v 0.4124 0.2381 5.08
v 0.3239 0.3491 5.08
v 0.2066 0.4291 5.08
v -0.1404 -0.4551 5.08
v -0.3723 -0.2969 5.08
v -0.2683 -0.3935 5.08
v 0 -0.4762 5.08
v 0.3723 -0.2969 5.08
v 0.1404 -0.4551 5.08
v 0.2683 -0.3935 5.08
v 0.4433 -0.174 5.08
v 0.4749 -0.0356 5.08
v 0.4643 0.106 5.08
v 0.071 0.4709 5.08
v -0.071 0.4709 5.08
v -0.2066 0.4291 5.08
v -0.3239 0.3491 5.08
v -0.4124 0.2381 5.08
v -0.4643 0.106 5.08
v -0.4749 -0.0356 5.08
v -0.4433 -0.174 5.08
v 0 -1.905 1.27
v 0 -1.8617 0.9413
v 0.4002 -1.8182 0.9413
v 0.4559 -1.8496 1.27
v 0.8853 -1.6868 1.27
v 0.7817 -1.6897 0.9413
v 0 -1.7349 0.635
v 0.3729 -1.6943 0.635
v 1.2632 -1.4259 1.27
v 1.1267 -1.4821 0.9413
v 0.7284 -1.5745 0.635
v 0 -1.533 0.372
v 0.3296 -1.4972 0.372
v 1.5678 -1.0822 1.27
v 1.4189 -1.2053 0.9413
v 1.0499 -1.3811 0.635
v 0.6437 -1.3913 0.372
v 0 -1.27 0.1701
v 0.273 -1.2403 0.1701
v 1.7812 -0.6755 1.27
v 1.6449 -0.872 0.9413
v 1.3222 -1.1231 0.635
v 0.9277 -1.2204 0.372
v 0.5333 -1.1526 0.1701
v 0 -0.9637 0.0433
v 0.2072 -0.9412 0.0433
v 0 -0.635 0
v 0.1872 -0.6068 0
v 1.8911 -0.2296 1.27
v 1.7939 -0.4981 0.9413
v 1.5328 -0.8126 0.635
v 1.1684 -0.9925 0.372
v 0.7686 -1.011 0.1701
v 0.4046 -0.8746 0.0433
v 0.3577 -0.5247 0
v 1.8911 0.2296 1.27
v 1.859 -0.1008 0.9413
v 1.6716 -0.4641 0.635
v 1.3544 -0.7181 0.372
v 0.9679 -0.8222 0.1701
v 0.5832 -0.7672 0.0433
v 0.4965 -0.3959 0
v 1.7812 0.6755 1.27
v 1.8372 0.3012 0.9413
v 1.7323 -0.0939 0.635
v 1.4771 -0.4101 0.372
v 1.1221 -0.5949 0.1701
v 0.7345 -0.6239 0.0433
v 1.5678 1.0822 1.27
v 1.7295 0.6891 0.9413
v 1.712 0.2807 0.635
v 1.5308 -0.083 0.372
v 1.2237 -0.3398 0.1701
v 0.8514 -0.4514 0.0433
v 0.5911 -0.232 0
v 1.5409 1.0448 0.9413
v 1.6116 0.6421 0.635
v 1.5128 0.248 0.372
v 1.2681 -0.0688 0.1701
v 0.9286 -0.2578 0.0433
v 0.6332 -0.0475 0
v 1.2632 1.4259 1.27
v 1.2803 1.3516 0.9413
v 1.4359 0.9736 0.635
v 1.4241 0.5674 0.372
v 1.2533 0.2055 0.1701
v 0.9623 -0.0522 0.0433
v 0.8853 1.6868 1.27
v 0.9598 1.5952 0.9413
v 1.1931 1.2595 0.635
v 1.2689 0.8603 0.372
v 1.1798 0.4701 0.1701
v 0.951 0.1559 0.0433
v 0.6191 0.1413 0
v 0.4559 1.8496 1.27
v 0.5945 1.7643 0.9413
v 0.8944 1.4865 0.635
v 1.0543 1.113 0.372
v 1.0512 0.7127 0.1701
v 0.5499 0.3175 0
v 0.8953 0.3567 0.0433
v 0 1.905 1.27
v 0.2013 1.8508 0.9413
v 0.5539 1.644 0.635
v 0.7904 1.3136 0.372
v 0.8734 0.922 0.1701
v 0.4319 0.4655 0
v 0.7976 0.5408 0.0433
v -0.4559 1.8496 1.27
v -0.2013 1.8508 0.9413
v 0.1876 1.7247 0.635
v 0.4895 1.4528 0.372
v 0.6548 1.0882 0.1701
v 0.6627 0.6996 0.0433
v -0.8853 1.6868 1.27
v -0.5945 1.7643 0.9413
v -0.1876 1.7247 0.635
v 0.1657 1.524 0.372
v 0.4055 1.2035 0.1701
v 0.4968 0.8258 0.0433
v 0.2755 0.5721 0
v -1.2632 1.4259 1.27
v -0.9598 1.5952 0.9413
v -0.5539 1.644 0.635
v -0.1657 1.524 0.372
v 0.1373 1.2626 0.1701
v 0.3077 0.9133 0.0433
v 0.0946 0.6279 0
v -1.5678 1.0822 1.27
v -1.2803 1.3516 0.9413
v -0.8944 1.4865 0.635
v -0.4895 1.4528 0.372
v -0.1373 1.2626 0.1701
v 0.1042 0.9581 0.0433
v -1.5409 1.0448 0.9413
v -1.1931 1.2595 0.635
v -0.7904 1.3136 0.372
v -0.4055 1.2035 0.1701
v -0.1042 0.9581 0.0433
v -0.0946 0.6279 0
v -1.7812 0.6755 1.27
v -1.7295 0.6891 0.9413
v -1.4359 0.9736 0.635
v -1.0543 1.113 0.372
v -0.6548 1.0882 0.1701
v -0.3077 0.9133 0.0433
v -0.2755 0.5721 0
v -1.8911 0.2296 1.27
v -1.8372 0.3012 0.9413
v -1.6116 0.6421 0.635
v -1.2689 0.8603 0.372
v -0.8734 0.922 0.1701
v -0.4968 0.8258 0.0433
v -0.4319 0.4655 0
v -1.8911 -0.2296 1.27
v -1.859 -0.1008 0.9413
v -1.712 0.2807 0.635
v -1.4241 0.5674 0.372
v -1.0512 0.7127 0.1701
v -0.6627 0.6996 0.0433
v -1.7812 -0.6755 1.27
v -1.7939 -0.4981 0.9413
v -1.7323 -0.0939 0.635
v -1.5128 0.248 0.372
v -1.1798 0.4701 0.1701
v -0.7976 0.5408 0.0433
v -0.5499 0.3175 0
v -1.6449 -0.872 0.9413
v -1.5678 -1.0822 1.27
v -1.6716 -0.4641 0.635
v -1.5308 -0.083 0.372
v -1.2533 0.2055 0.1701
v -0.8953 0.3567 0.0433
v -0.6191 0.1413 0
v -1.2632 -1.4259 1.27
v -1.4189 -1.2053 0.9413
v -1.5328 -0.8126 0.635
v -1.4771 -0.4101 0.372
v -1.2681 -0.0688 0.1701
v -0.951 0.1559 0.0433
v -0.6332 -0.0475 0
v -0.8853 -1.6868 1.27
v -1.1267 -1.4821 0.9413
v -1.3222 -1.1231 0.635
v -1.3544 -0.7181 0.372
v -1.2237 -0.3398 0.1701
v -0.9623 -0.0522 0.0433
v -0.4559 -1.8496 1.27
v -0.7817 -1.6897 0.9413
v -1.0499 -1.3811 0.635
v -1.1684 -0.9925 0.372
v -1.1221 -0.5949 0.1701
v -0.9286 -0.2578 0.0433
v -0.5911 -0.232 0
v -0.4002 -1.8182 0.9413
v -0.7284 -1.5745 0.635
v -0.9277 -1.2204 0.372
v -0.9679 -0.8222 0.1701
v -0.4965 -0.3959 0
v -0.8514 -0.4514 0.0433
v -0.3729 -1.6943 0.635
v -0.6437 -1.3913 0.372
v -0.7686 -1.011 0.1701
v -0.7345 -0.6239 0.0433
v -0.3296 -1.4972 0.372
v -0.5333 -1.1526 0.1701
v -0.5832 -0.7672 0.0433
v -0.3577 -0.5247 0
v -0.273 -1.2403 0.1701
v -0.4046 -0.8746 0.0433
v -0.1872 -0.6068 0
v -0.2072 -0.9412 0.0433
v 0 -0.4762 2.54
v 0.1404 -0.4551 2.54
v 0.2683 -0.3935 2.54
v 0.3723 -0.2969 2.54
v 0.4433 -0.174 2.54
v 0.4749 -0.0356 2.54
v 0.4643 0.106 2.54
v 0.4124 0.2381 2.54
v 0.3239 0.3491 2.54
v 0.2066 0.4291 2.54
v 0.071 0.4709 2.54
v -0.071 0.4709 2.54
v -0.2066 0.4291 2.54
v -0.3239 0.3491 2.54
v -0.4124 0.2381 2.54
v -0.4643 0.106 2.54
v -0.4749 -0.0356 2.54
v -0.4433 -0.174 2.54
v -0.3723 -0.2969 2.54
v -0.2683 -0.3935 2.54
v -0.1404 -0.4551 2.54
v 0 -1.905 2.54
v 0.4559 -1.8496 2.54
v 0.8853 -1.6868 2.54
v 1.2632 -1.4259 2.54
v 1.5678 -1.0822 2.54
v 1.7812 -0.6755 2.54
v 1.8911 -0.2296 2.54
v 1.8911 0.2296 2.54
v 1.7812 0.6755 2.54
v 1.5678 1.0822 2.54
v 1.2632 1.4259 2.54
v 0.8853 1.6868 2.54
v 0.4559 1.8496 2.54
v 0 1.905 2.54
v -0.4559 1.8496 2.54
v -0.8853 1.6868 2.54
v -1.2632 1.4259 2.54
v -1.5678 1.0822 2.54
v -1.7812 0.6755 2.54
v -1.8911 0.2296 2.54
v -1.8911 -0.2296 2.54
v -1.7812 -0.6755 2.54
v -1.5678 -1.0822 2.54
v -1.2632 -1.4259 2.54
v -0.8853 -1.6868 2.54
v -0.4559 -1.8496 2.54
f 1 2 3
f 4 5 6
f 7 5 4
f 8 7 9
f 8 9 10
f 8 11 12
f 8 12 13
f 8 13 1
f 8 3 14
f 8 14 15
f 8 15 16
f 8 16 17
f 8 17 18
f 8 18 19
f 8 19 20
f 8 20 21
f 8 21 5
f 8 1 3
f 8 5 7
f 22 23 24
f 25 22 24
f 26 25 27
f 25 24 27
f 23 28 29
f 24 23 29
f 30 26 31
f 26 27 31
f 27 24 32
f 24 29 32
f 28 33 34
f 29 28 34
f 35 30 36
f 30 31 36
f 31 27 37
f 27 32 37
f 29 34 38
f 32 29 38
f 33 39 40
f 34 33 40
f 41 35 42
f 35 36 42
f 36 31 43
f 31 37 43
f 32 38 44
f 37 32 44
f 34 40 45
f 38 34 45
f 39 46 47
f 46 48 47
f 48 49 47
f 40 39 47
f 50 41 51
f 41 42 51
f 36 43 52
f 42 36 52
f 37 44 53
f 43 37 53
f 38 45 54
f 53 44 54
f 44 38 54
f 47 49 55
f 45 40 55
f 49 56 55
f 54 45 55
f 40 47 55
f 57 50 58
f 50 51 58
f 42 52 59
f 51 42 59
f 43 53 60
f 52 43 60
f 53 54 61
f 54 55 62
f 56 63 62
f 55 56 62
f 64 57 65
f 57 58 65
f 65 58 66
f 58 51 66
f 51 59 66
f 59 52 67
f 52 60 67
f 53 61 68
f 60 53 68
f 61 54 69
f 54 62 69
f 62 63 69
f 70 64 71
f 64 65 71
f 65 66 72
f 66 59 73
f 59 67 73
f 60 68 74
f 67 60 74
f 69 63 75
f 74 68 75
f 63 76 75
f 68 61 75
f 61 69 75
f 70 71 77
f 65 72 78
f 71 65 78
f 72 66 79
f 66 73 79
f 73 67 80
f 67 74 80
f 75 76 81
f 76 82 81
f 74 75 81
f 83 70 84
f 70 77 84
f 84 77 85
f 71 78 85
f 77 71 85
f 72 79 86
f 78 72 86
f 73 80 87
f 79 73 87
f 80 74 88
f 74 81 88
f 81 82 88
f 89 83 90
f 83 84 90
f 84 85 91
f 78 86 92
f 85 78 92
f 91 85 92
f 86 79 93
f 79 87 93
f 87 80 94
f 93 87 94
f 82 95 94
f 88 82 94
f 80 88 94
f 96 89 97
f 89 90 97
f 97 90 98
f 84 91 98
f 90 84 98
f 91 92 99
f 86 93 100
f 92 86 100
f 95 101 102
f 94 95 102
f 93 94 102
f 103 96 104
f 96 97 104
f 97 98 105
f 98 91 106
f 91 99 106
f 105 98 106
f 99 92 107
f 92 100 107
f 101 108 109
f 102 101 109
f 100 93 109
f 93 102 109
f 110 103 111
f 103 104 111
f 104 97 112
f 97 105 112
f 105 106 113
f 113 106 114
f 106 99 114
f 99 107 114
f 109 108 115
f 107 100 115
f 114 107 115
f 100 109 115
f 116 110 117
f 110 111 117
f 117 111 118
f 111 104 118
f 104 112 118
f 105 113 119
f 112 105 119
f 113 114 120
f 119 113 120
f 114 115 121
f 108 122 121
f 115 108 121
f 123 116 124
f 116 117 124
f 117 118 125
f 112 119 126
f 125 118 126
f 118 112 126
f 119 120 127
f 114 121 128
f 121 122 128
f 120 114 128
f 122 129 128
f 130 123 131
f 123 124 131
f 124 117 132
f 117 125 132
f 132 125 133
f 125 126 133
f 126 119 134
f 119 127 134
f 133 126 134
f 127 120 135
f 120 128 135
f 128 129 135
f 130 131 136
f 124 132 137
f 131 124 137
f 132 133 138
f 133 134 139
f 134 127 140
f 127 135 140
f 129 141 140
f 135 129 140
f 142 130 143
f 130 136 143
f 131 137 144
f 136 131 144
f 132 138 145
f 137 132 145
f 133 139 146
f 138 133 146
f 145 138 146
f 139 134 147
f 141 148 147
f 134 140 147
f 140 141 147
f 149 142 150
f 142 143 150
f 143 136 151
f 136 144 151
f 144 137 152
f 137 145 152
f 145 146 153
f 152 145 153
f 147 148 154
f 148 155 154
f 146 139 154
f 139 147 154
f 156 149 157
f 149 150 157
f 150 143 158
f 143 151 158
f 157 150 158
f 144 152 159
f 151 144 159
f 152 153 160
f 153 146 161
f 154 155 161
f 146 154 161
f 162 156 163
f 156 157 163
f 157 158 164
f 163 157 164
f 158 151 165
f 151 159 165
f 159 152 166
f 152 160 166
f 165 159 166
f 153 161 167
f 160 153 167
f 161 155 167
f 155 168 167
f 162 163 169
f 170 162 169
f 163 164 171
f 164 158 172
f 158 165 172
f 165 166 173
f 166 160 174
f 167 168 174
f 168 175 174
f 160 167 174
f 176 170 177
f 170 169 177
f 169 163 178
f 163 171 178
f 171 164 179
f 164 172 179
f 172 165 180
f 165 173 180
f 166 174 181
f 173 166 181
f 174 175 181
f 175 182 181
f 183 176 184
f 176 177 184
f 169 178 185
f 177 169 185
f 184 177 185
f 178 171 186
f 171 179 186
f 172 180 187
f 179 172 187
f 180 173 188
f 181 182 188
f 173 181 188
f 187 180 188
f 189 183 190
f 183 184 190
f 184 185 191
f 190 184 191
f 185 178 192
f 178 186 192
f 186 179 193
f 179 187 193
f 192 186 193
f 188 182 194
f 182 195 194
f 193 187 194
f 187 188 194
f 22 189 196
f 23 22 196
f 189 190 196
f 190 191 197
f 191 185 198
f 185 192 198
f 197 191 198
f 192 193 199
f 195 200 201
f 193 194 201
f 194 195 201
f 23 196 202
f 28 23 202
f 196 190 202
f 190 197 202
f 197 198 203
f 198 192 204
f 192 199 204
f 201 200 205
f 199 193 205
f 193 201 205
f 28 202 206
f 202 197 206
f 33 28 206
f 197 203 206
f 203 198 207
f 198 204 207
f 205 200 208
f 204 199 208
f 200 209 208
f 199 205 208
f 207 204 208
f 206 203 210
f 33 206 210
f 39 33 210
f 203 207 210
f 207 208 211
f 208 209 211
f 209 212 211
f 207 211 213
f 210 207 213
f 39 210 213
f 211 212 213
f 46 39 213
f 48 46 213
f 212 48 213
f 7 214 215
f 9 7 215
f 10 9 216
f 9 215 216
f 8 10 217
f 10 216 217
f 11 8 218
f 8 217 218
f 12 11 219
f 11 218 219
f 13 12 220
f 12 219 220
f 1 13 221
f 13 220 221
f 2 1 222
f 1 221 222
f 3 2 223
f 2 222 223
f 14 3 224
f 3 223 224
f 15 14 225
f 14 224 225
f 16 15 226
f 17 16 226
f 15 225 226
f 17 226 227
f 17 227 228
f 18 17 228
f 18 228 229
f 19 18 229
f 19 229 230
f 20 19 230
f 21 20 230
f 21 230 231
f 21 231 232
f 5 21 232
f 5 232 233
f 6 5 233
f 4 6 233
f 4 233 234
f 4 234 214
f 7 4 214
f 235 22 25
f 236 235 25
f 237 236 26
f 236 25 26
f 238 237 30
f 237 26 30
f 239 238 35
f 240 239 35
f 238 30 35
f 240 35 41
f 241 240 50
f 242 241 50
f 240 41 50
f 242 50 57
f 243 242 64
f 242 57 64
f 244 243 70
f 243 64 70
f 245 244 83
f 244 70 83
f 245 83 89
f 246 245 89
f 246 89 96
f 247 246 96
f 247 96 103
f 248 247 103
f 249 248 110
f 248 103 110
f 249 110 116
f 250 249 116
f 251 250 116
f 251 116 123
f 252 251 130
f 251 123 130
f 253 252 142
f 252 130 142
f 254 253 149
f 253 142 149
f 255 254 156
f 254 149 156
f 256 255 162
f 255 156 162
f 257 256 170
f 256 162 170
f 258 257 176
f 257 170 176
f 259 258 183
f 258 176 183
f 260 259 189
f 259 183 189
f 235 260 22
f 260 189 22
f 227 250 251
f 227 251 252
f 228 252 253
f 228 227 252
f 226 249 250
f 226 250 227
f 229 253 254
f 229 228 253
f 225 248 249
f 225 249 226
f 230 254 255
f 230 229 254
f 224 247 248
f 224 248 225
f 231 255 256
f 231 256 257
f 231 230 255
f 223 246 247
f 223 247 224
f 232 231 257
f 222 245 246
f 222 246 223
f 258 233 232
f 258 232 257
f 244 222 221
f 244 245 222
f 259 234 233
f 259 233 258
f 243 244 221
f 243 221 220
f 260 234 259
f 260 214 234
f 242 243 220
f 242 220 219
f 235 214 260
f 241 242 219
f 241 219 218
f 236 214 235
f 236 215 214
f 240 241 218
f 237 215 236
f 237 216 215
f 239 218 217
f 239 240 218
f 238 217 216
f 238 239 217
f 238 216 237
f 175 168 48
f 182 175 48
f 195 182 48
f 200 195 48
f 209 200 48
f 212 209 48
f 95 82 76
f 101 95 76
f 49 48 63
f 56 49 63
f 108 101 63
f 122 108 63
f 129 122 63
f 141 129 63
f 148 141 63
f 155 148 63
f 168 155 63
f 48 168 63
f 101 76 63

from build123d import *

# Parameters (mm, degrees)
F0_R     = 1.905
F0_R_2   = 0.47625
F1_DEPTH = 2.54
F2_DEPTH = 5.08
F4_R     = 1.27
F3_R     = 2.58953
F5_DEPTH = 1.906
F6_DEPTH = 25.4
F7_ANGLE = 90


with BuildPart() as f1:
    # F0 (on Top) → F1 (new body)
    with BuildSketch(Plane.XY):
        Circle(F0_R)
        Circle(F0_R_2, mode=Mode.SUBTRACT)
    extrude(amount=F1_DEPTH)

    # F0 (on Top) → F2 (join)
    with BuildSketch(Plane.XY):
        Circle(F0_R_2)
    extrude(amount=F2_DEPTH)

    # F4
    f4_edges = [f1.edges().sort_by_distance(p)[0] for p in [
        (-1.905, 0, 0),
    ]]
    fillet(f4_edges, radius=F4_R)

    # F3 (on Front) → F5 (cut, through all)
    with BuildSketch(Plane.XZ):
        with Locations((8.706267, 1.083521)):
            Circle(F3_R)
    extrude(amount=-F5_DEPTH, mode=Mode.SUBTRACT)

    # F3 (on Front) → F6 (cut)
    with BuildSketch(Plane.XZ):
        with Locations((8.706267, 1.083521)):
            Circle(F3_R)
    extrude(amount=F6_DEPTH, mode=Mode.SUBTRACT)


with BuildPart() as f1_1:
    # F7: moved
    add(f1.part.rotate(Axis((0, 0, 0), (0, 0, -1)), F7_ANGLE))


solid = f1_1.part
